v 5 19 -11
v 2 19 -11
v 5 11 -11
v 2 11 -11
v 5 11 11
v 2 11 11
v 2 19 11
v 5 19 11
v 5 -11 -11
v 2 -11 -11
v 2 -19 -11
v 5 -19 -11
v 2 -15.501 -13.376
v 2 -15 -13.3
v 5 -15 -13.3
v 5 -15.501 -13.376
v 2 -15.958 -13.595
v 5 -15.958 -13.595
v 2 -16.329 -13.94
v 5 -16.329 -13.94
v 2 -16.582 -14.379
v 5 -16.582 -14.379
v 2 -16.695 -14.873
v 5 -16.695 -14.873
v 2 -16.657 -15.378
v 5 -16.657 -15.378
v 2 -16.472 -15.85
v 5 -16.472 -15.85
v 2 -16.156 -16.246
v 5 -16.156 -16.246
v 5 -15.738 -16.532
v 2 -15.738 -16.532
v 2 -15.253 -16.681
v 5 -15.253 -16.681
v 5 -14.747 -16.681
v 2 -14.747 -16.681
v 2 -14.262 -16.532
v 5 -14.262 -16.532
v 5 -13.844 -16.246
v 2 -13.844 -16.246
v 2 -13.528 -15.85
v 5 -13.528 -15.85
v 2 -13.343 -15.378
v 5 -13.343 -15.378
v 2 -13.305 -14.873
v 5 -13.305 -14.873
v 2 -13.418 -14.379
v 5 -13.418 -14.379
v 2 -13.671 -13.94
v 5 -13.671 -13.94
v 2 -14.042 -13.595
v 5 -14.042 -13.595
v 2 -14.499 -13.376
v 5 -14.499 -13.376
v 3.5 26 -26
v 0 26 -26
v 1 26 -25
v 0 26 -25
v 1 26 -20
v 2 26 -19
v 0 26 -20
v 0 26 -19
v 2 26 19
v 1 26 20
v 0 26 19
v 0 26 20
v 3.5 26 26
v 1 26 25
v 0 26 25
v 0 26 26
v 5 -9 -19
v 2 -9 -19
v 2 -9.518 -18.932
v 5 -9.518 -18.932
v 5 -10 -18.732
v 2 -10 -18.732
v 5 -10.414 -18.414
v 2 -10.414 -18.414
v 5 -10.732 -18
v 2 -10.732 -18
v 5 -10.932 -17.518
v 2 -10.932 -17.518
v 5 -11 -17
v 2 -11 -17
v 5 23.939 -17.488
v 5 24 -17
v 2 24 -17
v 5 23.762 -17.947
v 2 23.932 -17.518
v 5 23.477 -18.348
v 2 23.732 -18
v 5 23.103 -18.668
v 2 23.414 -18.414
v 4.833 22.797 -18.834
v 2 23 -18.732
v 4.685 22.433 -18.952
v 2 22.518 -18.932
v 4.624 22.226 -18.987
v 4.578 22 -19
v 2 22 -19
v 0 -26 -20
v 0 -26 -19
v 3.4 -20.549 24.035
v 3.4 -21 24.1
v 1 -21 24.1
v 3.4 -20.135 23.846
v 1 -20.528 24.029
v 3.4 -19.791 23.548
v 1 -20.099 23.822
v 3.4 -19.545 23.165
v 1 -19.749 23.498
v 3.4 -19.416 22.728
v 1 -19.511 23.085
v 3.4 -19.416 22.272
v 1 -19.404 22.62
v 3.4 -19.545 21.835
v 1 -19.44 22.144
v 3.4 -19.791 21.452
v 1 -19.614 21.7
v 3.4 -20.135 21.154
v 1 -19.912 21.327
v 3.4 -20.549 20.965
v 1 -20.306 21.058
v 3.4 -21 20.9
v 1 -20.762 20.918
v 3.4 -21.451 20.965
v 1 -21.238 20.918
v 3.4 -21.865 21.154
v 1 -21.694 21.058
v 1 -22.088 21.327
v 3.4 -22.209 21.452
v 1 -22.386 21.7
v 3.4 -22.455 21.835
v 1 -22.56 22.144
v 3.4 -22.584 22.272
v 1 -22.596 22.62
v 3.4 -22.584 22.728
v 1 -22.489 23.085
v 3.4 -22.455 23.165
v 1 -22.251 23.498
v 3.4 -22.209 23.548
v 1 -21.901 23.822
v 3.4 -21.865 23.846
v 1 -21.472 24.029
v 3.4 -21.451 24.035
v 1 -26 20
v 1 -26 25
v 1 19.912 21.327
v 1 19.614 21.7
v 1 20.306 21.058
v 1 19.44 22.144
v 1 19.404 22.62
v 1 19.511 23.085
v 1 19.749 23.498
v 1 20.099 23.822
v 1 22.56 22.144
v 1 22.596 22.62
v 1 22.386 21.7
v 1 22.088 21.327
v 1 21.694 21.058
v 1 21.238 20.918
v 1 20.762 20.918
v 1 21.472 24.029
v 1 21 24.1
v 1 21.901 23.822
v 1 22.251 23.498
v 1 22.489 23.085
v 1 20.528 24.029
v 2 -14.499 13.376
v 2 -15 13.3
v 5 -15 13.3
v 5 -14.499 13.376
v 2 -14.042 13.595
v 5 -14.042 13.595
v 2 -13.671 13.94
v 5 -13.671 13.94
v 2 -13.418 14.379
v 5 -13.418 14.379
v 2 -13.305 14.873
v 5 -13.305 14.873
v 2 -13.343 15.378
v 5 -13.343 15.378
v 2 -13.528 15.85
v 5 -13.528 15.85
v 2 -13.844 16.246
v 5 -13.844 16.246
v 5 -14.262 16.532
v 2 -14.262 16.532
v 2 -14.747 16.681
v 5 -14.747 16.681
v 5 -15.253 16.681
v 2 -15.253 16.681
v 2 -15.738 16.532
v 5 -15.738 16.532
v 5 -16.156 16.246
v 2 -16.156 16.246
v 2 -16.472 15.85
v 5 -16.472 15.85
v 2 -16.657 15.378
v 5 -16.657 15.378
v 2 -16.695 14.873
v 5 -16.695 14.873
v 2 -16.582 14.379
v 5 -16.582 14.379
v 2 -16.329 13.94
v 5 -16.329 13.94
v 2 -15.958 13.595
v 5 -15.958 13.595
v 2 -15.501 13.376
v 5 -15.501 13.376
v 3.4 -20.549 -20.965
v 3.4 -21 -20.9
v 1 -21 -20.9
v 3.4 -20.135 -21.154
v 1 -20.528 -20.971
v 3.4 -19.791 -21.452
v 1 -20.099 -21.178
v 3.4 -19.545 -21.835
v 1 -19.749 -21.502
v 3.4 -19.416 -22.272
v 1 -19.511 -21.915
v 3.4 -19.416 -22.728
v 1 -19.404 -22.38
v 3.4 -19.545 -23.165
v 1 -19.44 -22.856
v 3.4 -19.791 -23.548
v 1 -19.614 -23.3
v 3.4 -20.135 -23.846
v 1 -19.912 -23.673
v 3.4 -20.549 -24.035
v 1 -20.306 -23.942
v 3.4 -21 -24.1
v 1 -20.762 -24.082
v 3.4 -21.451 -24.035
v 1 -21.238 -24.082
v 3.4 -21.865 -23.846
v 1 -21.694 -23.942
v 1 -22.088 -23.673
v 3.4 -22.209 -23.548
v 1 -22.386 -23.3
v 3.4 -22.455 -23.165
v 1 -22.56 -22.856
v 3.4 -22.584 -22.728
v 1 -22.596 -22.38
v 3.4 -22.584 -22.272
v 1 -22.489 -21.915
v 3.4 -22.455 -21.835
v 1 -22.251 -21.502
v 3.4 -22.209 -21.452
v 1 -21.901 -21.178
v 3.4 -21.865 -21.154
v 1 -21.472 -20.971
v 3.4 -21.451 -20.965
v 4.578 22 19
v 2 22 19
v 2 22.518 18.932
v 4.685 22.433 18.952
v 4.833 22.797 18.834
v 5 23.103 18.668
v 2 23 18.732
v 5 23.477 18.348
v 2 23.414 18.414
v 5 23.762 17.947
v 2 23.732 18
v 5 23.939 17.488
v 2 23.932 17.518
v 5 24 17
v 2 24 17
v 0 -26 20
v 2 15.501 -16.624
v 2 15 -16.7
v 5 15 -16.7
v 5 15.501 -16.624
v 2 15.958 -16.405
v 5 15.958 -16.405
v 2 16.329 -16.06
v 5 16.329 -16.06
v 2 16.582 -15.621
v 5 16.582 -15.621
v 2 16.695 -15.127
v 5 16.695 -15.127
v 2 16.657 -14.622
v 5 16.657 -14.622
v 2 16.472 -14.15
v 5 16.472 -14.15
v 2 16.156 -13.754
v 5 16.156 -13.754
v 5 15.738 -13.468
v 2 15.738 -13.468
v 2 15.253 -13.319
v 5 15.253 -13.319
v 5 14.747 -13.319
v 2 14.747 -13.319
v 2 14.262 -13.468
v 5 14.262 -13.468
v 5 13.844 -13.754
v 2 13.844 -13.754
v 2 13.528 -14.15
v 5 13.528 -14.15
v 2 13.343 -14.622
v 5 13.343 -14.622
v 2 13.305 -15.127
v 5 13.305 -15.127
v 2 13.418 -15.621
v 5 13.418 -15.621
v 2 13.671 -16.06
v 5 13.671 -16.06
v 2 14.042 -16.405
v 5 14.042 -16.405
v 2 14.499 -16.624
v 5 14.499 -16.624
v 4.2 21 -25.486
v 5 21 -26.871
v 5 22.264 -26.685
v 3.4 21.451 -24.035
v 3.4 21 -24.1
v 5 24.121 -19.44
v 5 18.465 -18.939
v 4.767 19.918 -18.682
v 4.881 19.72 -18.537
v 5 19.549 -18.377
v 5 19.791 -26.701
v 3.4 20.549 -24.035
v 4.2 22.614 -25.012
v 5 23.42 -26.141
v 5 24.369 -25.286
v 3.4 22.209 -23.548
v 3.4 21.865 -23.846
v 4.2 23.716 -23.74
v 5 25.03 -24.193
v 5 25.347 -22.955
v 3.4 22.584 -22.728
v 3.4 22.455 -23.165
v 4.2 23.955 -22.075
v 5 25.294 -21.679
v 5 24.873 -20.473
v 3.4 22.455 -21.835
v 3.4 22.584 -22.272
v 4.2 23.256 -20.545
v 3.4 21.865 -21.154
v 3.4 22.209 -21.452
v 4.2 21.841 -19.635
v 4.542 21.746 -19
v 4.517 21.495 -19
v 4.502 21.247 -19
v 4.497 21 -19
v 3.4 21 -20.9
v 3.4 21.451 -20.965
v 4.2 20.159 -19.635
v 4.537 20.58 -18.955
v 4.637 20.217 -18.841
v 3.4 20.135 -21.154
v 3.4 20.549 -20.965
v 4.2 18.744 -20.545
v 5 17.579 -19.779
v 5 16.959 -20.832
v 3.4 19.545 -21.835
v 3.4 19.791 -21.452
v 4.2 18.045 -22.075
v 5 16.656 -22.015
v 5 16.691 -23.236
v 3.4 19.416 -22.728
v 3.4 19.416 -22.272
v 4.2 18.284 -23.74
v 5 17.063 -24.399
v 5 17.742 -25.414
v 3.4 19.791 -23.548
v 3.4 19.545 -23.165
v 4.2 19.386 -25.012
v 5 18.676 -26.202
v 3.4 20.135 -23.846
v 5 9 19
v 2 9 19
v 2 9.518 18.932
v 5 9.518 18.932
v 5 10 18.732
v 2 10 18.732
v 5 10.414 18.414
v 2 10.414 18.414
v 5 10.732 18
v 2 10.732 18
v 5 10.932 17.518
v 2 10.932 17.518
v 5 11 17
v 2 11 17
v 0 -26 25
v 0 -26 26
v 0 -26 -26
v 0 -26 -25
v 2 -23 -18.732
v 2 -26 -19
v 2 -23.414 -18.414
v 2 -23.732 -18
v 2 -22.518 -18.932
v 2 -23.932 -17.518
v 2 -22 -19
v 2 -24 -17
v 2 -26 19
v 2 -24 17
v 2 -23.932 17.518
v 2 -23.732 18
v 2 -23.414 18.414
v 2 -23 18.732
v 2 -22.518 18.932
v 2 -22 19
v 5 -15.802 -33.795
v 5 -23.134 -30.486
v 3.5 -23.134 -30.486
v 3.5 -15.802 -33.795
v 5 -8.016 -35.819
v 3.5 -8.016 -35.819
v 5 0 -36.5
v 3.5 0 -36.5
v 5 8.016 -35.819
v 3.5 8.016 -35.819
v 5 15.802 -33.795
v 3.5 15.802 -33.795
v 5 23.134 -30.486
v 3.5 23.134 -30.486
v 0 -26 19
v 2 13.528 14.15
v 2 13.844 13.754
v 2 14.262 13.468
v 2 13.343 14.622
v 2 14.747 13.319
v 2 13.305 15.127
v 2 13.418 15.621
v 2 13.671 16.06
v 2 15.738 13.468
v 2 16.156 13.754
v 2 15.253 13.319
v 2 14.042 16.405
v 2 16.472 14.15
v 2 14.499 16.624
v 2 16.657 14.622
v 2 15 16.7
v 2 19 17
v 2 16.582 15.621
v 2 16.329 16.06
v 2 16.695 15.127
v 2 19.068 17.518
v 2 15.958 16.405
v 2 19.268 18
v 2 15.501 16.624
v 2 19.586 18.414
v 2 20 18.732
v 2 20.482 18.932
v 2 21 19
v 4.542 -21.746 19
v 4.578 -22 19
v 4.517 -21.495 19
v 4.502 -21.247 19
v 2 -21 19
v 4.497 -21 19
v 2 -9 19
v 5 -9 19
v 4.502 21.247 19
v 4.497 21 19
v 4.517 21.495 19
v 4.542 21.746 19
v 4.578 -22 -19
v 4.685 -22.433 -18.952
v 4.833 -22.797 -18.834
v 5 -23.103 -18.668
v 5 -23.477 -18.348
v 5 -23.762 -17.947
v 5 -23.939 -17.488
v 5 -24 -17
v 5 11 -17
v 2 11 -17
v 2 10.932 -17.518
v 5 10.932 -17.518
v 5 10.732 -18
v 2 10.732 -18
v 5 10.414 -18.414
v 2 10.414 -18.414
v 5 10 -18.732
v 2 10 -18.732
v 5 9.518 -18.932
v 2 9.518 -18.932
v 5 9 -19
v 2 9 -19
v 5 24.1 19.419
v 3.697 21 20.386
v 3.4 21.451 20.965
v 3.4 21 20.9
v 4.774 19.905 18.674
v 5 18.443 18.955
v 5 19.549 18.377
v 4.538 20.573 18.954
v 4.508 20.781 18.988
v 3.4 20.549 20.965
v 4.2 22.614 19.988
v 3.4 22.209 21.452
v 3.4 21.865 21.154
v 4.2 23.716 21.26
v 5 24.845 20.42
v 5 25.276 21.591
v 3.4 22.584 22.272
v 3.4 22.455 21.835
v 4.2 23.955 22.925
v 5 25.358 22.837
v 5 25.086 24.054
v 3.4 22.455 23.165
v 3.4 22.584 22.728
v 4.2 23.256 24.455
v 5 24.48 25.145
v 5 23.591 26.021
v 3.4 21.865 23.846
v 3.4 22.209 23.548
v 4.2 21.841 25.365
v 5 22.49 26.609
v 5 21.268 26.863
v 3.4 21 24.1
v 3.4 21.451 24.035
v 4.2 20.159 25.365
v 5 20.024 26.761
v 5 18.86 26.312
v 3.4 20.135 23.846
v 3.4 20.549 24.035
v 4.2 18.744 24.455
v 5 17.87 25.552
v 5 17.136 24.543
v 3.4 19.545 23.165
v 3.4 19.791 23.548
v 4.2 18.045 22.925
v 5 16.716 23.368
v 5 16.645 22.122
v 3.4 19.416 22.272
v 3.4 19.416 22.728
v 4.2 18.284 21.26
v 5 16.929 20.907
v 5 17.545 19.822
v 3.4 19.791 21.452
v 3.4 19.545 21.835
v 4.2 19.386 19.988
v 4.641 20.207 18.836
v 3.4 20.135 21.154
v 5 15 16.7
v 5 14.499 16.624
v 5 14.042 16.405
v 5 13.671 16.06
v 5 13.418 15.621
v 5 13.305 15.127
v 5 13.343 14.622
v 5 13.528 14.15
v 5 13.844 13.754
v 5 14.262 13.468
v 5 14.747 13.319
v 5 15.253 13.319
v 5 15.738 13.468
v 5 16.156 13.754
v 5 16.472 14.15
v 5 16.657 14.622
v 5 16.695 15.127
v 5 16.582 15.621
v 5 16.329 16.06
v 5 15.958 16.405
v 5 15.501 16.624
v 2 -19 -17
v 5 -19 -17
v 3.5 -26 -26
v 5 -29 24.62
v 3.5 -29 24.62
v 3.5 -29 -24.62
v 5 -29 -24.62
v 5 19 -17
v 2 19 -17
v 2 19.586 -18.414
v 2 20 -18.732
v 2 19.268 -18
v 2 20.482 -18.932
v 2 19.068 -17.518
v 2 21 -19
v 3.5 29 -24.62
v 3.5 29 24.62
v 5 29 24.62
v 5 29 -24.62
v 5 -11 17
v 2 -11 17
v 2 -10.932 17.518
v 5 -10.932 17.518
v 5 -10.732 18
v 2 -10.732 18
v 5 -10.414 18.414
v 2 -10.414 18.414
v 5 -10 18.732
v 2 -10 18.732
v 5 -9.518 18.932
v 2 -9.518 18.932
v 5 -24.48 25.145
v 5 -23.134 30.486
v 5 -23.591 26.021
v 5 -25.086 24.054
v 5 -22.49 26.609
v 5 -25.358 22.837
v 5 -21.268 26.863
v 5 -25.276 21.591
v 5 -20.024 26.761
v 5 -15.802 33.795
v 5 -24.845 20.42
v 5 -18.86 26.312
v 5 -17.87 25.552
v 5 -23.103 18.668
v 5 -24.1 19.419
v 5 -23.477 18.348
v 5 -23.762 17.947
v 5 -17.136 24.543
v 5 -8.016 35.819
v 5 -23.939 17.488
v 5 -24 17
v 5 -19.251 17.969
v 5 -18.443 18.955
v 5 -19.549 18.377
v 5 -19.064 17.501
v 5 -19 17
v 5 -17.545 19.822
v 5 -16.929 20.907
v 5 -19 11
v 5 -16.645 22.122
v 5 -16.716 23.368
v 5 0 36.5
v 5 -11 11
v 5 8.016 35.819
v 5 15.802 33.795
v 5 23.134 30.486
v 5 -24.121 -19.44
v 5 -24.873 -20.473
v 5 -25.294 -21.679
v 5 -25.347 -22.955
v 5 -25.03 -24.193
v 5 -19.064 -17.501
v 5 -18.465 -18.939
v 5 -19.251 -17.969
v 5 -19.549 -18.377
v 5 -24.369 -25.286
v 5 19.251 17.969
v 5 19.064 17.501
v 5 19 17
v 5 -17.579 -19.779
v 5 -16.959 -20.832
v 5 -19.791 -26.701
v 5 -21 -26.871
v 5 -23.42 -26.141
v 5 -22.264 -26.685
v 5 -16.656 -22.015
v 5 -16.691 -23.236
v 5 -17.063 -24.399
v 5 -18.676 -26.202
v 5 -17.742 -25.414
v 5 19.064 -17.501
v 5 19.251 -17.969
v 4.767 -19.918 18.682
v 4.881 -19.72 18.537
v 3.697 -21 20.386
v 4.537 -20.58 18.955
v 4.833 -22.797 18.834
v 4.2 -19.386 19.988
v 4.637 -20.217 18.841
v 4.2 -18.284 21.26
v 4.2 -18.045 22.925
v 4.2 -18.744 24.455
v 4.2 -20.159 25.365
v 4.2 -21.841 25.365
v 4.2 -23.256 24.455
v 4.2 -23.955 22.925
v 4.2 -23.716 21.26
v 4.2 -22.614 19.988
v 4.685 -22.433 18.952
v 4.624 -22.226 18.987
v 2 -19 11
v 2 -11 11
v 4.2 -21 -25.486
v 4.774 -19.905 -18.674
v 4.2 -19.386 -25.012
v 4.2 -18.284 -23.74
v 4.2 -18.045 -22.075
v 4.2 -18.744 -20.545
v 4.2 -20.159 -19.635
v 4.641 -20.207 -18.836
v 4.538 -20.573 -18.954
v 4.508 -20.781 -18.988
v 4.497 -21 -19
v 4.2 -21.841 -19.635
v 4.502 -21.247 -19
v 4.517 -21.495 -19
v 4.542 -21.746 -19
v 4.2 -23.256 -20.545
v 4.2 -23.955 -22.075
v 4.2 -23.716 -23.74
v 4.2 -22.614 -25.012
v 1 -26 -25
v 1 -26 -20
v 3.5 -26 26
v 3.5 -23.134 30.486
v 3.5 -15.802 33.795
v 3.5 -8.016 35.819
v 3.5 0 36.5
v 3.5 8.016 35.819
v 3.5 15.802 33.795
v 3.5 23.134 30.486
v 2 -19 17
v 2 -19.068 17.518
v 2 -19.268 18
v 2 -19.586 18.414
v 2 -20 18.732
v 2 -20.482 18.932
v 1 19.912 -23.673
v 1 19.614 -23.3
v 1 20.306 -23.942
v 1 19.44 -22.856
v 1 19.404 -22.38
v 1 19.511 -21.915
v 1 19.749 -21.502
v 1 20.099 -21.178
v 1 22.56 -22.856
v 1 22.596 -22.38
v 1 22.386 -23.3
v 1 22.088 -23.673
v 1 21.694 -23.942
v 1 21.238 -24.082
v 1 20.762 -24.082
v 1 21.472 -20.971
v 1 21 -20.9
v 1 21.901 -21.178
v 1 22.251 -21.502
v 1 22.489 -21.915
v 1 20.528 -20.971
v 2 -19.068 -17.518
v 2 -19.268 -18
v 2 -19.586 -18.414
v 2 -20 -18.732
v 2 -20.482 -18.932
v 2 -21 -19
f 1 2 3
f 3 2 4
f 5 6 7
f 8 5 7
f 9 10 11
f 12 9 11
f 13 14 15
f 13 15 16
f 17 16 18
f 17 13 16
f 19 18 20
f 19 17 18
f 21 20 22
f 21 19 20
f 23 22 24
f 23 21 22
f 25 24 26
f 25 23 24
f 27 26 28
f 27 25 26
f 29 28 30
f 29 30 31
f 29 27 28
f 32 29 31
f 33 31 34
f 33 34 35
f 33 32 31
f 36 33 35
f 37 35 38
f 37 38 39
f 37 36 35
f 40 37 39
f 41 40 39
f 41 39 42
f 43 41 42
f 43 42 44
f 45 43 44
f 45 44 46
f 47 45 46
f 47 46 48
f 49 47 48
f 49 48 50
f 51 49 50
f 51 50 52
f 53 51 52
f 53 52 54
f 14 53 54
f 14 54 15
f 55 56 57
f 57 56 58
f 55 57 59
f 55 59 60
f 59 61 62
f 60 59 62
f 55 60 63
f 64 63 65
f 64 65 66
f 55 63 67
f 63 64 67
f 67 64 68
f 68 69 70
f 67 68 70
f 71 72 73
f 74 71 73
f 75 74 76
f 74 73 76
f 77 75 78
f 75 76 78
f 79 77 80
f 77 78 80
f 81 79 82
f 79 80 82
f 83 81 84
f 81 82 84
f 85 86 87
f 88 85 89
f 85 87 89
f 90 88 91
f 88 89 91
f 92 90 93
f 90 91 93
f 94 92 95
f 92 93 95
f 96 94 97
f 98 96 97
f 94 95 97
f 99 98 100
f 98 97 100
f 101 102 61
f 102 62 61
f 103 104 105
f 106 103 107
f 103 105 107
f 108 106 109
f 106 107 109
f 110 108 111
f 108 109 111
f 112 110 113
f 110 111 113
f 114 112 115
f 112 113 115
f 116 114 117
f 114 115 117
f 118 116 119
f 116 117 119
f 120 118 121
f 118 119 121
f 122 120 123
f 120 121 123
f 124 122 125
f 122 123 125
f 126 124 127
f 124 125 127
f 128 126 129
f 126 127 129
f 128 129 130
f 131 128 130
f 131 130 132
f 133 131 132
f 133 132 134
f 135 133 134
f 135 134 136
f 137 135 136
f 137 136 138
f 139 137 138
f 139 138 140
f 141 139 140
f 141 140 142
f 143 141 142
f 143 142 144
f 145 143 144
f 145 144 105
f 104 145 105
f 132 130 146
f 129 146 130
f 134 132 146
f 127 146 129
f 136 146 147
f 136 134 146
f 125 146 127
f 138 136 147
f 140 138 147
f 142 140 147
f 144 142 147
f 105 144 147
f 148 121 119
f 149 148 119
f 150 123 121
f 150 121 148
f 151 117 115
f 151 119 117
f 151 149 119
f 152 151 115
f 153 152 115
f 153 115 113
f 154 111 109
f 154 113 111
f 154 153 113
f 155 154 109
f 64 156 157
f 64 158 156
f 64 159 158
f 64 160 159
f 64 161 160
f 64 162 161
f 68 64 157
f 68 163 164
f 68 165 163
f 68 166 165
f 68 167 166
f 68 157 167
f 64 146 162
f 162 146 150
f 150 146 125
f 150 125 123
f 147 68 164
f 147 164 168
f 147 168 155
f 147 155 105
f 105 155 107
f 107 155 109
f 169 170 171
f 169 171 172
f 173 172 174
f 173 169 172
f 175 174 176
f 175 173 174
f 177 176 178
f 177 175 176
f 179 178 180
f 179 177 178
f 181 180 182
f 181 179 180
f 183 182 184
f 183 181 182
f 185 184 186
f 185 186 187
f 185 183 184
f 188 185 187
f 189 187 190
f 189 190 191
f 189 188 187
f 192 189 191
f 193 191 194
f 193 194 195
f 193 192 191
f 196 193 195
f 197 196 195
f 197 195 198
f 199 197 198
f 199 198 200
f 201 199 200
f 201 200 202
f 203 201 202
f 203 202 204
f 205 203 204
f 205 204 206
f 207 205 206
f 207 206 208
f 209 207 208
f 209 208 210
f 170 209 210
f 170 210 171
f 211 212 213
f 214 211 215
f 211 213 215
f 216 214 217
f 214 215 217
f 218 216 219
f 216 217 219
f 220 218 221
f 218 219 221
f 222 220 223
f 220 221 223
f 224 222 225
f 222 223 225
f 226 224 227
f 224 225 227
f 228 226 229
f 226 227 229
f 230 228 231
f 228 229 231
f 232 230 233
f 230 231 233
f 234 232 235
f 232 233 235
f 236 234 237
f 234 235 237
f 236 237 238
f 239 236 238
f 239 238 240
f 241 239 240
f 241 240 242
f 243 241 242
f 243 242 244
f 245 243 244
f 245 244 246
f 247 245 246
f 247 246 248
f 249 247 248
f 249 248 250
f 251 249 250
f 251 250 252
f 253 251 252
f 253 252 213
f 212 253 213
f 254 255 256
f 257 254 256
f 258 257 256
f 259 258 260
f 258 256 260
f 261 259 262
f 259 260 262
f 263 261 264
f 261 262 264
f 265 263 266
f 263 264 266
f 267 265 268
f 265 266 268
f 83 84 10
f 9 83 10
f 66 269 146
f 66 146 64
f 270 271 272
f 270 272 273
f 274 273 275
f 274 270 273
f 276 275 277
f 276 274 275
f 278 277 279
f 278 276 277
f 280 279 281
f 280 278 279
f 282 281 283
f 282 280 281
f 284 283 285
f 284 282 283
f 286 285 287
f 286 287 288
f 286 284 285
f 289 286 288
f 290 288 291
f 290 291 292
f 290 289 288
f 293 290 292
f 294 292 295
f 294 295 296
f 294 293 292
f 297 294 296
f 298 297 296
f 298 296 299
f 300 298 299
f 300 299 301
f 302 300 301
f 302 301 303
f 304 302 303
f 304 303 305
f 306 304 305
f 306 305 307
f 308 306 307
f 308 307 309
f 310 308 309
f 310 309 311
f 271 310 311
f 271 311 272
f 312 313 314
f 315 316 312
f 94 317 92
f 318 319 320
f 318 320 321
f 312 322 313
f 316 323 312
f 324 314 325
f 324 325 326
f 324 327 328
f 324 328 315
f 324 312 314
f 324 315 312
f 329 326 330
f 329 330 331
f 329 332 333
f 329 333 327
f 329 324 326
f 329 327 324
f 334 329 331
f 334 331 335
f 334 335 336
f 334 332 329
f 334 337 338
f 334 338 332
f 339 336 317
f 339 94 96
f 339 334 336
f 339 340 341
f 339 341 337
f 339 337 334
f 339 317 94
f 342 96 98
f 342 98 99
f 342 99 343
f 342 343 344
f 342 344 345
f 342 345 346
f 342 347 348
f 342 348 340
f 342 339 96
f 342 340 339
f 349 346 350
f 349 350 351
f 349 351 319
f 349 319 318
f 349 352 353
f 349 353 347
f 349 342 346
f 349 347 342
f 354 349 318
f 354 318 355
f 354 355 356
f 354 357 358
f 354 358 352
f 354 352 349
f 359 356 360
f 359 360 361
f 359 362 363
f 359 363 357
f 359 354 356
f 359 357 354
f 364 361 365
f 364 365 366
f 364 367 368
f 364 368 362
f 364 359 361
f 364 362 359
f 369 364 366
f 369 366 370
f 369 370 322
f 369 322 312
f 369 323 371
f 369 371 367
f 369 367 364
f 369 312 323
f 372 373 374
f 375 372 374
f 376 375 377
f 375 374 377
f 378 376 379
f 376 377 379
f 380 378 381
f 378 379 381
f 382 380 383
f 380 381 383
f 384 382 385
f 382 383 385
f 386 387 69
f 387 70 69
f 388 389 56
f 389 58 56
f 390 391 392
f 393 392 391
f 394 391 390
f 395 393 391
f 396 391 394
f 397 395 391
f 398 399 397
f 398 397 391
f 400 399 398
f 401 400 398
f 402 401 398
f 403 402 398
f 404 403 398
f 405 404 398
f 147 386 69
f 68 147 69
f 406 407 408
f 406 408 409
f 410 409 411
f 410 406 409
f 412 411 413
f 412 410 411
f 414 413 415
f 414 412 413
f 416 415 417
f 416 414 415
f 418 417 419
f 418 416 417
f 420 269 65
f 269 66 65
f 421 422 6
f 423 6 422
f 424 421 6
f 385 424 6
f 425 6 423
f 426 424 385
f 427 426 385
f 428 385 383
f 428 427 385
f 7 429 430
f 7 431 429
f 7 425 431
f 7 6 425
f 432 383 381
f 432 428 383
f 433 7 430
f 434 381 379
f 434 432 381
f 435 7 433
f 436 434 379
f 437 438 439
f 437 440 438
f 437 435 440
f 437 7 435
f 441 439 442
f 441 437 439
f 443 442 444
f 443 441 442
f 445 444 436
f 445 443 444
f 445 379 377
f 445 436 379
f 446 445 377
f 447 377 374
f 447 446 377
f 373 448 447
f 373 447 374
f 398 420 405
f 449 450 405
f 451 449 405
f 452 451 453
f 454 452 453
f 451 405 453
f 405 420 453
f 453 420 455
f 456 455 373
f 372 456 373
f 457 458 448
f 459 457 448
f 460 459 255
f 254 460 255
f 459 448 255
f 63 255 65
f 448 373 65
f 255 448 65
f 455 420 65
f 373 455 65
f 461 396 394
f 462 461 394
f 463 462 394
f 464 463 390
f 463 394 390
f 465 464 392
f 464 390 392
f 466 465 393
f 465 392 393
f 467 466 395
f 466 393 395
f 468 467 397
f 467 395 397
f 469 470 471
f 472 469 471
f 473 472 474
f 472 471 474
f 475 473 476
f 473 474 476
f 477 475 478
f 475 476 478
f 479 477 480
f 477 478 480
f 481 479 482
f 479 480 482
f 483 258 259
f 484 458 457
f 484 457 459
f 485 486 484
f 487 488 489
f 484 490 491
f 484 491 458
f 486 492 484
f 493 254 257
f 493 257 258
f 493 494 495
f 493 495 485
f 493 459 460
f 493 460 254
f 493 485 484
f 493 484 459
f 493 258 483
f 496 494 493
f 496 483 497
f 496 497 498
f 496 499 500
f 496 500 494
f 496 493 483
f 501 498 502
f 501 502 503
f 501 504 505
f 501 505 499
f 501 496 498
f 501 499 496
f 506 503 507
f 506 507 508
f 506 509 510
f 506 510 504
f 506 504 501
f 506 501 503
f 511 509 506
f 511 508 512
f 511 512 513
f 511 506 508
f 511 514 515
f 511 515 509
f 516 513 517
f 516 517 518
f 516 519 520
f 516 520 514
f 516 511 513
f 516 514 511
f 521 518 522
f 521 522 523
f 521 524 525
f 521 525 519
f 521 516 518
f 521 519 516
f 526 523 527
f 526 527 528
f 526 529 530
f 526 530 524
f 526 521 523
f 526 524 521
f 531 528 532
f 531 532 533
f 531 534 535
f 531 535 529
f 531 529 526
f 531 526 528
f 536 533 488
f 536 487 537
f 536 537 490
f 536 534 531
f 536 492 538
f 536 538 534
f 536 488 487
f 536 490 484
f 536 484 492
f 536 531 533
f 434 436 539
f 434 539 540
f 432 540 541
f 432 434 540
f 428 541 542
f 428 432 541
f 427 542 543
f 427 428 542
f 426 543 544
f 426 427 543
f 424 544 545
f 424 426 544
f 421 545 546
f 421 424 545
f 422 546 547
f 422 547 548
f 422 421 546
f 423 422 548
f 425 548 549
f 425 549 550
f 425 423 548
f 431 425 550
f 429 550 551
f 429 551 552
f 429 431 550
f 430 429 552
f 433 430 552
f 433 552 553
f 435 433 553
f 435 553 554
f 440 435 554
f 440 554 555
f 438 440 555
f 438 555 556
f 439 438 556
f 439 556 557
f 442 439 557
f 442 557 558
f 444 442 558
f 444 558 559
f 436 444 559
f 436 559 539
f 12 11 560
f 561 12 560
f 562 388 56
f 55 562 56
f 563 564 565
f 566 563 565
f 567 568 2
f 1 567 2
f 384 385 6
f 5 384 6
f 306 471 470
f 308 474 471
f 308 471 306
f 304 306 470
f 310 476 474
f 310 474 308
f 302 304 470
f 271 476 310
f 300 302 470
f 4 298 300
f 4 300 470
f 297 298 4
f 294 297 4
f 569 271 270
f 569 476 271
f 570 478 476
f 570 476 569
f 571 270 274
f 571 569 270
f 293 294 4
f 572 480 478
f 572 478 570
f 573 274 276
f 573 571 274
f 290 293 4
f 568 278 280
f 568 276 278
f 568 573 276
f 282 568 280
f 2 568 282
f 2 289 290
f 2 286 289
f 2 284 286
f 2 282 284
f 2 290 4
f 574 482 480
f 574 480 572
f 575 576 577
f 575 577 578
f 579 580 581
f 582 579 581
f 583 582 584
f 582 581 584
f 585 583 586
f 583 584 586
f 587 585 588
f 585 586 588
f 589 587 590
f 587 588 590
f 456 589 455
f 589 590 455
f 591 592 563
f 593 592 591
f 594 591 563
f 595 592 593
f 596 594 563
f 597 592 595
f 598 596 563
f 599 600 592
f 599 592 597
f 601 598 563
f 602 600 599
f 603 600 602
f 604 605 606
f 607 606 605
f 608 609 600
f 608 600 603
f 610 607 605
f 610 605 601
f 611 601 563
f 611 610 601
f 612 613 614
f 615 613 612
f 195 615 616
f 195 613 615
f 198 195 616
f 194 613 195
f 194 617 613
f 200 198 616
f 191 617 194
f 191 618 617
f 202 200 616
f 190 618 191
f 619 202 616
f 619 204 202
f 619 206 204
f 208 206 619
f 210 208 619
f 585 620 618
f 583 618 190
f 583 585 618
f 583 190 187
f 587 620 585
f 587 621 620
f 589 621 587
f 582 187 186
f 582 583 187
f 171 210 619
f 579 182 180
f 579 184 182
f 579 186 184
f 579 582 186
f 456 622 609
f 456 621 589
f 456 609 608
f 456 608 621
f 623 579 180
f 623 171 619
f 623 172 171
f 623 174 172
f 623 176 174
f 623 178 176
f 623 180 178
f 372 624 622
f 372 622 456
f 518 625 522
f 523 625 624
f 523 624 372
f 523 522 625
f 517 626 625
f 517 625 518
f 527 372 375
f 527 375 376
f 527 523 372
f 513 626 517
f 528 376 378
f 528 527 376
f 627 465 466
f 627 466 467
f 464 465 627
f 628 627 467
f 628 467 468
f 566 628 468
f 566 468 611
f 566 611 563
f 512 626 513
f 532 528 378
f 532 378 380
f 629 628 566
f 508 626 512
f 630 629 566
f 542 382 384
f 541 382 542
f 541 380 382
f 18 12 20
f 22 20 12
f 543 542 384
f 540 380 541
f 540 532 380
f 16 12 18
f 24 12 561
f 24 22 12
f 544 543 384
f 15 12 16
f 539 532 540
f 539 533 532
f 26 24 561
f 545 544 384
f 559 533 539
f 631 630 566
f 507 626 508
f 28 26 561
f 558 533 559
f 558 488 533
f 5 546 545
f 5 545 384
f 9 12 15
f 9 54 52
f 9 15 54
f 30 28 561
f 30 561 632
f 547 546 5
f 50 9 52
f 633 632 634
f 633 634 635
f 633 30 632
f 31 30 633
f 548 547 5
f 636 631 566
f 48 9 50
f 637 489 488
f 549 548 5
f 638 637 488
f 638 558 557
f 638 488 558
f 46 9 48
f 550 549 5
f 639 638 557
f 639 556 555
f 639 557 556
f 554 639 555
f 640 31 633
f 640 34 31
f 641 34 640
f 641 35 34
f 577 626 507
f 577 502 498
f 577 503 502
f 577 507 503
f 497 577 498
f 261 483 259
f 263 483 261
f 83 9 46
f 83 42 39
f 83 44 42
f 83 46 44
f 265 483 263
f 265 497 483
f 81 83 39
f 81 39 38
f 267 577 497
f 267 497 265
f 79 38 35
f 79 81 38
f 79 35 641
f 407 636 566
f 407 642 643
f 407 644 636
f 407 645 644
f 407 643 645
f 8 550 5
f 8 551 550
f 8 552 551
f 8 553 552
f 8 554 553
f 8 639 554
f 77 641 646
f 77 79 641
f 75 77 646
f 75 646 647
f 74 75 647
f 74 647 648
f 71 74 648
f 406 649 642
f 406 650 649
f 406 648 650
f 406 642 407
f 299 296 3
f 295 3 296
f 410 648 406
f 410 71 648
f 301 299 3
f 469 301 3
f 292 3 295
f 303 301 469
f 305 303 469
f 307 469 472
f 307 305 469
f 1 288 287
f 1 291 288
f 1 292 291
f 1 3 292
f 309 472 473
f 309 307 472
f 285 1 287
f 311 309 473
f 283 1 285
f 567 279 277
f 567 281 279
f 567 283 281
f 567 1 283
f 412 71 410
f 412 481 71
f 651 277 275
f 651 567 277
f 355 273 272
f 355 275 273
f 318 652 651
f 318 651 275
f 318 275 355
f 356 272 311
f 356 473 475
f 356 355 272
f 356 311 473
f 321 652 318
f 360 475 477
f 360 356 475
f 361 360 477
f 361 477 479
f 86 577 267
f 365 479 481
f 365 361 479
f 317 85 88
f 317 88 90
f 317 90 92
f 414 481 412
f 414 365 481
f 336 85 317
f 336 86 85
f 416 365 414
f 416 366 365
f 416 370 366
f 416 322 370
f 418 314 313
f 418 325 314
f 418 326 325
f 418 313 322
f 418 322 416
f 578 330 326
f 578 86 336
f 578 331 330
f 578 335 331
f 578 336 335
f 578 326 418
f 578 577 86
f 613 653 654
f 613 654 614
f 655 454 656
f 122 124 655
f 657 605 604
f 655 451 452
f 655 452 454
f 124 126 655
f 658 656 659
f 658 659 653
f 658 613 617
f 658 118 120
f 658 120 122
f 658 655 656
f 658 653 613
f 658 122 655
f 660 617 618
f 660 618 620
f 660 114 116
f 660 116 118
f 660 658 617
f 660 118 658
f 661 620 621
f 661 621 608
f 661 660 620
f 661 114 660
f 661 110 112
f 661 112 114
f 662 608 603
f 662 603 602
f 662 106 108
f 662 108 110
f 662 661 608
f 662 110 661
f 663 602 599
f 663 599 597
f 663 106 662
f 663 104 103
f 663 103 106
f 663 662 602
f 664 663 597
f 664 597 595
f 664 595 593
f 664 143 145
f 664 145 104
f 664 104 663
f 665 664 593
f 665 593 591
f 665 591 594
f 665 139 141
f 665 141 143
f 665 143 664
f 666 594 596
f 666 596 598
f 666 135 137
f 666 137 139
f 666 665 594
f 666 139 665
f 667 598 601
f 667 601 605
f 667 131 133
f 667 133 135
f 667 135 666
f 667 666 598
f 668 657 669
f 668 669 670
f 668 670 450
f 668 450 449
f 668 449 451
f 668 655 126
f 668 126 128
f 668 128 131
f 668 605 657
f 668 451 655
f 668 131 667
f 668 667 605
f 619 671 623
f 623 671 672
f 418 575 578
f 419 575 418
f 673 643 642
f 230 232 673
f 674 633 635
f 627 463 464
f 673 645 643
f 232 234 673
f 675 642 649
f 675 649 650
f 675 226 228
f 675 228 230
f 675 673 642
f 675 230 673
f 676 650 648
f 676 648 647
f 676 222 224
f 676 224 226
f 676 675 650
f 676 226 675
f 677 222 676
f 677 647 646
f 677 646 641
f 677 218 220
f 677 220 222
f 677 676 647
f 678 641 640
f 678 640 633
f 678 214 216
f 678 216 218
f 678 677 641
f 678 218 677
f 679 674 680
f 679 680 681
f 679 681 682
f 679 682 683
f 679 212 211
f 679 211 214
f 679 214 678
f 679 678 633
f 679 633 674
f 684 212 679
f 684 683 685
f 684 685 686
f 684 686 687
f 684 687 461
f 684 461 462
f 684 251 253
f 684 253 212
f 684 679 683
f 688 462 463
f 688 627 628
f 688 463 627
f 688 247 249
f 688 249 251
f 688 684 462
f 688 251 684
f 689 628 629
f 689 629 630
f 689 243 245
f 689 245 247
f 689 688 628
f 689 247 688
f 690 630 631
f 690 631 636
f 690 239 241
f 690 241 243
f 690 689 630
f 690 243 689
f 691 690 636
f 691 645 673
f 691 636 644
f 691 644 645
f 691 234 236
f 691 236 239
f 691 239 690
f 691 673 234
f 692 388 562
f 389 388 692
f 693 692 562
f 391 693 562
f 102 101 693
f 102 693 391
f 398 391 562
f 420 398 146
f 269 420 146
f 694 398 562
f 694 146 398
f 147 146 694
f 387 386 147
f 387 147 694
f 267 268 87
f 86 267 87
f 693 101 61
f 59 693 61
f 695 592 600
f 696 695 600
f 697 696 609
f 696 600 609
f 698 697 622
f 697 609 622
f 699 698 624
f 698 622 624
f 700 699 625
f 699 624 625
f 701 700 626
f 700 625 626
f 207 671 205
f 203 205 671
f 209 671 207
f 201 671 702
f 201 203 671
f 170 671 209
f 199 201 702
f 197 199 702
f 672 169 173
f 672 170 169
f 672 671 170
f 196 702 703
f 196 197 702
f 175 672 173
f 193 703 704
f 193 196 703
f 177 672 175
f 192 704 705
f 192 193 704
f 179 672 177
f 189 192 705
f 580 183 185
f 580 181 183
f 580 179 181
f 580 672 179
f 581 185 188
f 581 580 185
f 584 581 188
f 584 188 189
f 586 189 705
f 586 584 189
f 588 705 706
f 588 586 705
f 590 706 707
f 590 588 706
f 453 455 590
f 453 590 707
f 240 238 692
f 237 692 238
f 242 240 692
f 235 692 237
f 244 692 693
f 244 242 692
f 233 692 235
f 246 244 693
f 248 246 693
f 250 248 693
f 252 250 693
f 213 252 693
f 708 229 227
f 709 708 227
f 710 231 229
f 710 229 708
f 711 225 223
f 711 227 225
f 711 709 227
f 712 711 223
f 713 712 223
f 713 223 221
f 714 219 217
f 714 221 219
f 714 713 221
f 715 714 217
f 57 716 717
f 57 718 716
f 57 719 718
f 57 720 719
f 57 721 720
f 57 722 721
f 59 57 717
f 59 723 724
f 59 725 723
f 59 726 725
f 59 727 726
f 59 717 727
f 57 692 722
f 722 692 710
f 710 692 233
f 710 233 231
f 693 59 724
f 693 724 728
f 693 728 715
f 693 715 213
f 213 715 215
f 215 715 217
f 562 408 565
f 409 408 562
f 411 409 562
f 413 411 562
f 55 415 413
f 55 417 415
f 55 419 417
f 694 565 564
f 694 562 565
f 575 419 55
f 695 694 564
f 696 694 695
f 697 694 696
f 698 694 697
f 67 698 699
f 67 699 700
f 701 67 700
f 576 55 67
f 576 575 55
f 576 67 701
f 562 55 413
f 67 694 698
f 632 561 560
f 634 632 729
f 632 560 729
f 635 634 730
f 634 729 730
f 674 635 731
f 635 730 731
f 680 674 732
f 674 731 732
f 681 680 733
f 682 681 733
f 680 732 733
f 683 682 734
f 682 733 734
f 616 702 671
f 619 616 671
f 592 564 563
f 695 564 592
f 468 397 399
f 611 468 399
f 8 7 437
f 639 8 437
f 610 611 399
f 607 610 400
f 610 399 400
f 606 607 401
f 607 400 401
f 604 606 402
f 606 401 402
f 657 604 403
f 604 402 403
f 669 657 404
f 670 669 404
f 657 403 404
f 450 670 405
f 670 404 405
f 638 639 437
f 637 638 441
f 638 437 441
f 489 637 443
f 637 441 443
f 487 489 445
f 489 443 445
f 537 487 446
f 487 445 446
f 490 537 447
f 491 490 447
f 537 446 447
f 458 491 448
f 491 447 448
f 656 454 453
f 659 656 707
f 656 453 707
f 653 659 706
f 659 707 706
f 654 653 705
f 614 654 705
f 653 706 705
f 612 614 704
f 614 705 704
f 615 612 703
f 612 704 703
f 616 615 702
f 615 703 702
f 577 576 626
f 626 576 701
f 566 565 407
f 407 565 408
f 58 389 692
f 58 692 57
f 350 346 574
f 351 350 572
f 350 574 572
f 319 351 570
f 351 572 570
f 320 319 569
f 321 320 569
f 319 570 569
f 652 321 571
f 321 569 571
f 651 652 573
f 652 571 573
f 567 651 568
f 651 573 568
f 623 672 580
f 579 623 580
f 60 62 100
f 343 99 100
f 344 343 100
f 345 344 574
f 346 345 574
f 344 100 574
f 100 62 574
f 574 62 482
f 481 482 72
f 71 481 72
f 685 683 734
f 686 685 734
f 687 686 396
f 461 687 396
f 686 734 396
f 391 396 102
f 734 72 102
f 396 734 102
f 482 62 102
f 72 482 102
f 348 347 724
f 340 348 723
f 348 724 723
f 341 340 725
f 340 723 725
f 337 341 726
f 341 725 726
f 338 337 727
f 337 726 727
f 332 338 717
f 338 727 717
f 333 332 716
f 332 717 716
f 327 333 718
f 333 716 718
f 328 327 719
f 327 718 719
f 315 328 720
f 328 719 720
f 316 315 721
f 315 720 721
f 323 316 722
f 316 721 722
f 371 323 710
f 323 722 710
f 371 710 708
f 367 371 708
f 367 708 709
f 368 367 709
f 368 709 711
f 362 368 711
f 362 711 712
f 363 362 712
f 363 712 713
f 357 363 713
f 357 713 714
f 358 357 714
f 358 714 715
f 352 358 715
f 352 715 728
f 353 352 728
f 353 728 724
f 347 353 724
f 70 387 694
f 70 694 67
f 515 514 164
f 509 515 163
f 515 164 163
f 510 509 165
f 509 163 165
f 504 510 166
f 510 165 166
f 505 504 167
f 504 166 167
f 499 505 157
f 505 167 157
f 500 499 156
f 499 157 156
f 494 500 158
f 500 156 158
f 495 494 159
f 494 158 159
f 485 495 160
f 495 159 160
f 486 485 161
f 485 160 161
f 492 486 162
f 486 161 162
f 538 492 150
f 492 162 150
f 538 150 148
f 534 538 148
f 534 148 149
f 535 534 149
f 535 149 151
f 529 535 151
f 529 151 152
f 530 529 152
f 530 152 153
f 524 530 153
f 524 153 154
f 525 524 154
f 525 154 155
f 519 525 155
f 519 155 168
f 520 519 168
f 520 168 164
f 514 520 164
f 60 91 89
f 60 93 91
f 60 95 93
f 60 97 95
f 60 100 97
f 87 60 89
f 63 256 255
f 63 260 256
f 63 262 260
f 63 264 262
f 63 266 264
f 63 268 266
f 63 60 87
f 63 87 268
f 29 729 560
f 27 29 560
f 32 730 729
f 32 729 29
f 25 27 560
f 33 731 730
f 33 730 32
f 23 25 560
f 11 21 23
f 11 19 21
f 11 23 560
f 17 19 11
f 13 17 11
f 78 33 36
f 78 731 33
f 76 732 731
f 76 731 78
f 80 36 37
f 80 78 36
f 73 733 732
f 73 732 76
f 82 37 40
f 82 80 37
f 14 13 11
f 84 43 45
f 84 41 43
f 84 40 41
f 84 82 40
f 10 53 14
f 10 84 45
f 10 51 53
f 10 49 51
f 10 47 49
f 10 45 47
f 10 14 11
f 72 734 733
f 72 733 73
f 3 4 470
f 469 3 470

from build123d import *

# Parameters (mm, degrees)
SKETCH_1_W                  = 58
SKETCH_1_H                  = 58
SKETCH_1_R                  = 1.7
EXTRUDE_1_DEPTH             = 5
SKETCH_2_W                  = 58
SKETCH_2_H                  = 58
SKETCH_2_W_2                = 52
SKETCH_2_H_2                = 52
CUT_EXTRUDE_1_DEPTH         = 3.5
SKETCH_3_W                  = 38
SKETCH_3_H                  = 52
CUT_EXTRUDE_2_DEPTH         = 2
SKETCH_4_W                  = 5
SKETCH_4_H                  = 52
CUT_EXTRUDE_3_DEPTH         = 1
SKETCH_8_R                  = 1.6
CUT_EXTRUDE_4_DEPTH         = 2.4
PATTERN_LINEAR_1_COUNT      = 2
PATTERN_LINEAR_1_PITCH      = 45
PATTERN_LINEAR_1_COUNT_DIR2 = 2
PATTERN_LINEAR_1_PITCH_DIR2 = 42
EXTRUDE_2_DEPTH             = 1.5
SKETCH_12_R                 = 63.004873171
CUT_EXTRUDE_6_DEPTH         = 1.5
CHAMFER_2_SIZE              = 2
CHAMFER_3_SIZE              = 2
CHAMFER_5_SIZE              = 2
CHAMFER_6_SIZE              = 2


with BuildPart() as part:
    # 草图1 → 凸台-拉伸1 (new body)
    with BuildSketch(Plane(origin=(0, 0, 0), x_dir=(0, 0, -1), z_dir=(1, 0, 0))):
        Rectangle(SKETCH_1_W, SKETCH_1_H)
        with Locations((15, 15)):
            Circle(SKETCH_1_R, mode=Mode.SUBTRACT)
        with Locations(Location((-15, 15, 0), (0, 0, 180))):
            Circle(SKETCH_1_R, mode=Mode.SUBTRACT)
        with Locations((-15, -15)):
            Circle(SKETCH_1_R, mode=Mode.SUBTRACT)
        with Locations(Location((15, -15, 0), (0, 0, 180))):
            Circle(SKETCH_1_R, mode=Mode.SUBTRACT)
        with BuildLine():
            Line((-17, 24), (17, 24))
            ThreePointArc((17, 24), (18.414213562, 23.414213562), (19, 22))
            Line((19, 22), (19, 21))
            ThreePointArc((19, 21), (18.414213562, 19.585786438), (17, 19))
            Line((17, 19), (11, 19))
            Line((11, 19), (11, 11))
            Line((11, 11), (17, 11))
            ThreePointArc((17, 11), (18.414213562, 10.414213562), (19, 9))
            Line((19, 9), (19, -9))
            ThreePointArc((19, -9), (18.414213562, -10.414213562), (17, -11))
            Line((17, -11), (11, -11))
            Line((11, -11), (11, -19))
            Line((11, -19), (17, -19))
            ThreePointArc((17, -19), (18.414213562, -19.585786438), (19, -21))
            Line((19, -21), (19, -22))
            ThreePointArc((19, -22), (18.414213562, -23.414213562), (17, -24))
            Line((17, -24), (-17, -24))
            ThreePointArc((-17, -24), (-18.414213562, -23.414213562), (-19, -22))
            Line((-19, -22), (-19, -21))
            ThreePointArc((-19, -21), (-18.414213562, -19.585786438), (-17, -19))
            Line((-17, -19), (-11, -19))
            Line((-11, -19), (-11, -11))
            Line((-11, -11), (-17, -11))
            ThreePointArc((-17, -11), (-18.414213562, -10.414213562), (-19, -9))
            Line((-19, -9), (-19, 9))
            ThreePointArc((-19, 9), (-18.414213562, 10.414213562), (-17, 11))
            Line((-17, 11), (-11, 11))
            Line((-11, 11), (-11, 19))
            Line((-11, 19), (-17, 19))
            ThreePointArc((-17, 19), (-18.414213562, 19.585786438), (-19, 21))
            Line((-19, 21), (-19, 22))
            ThreePointArc((-19, 22), (-18.414213562, 23.414213562), (-17, 24))
        make_face(mode=Mode.SUBTRACT)
    extrude(amount=EXTRUDE_1_DEPTH)

    # 草图2 → 切除-拉伸1 (cut)
    with BuildSketch(Plane.ZY):
        Rectangle(SKETCH_2_W, SKETCH_2_H)
        Rectangle(SKETCH_2_W_2, SKETCH_2_H_2, mode=Mode.SUBTRACT)
    extrude(amount=-CUT_EXTRUDE_1_DEPTH, mode=Mode.SUBTRACT)

    # 草图3 → 切除-拉伸2 (cut)
    with BuildSketch(Plane.ZY):
        Rectangle(SKETCH_3_W, SKETCH_3_H)
    extrude(amount=-CUT_EXTRUDE_2_DEPTH, mode=Mode.SUBTRACT)

    # 草图4 → 切除-拉伸3 (cut)
    with BuildSketch(Plane.ZY):
        with Locations((-22.5, 0)):
            Rectangle(SKETCH_4_W, SKETCH_4_H)
        with Locations((22.5, 0)):
            Rectangle(SKETCH_4_W, SKETCH_4_H)
    extrude(amount=-CUT_EXTRUDE_3_DEPTH, mode=Mode.SUBTRACT)

    # 草图8 → 切除-拉伸4 (cut)
    with BuildSketch(Plane.ZY.offset(-1)):
        with Locations((22.5, 21)):
            Circle(SKETCH_8_R)
    cut_extrude_4 = extrude(amount=-CUT_EXTRUDE_4_DEPTH, mode=Mode.SUBTRACT)

    # 草图9 → 切除-旋转2 (revolve, cut)
    with BuildSketch(Plane.XY.offset(22.5), mode=Mode.PRIVATE) as cut_revolve_2_sk:
        Polygon((3.4, 19.4), (3.4, 21), (5, 21), (5, 16.628718708), align=None)
    cut_revolve_2 = revolve(cut_revolve_2_sk.sketch.rotate(Axis((3.417252413, 21, 22.5), (1, 0, 0)), 90), axis=Axis((3.417252413, 21, 22.5), (1, 0, 0)), mode=Mode.SUBTRACT)

    # 阵列(线性)1: 切除-拉伸4, Cut-Revolve 2 2 × 2
    with Locations(*[(0, -j * PATTERN_LINEAR_1_PITCH_DIR2, -i * PATTERN_LINEAR_1_PITCH) for i in range(PATTERN_LINEAR_1_COUNT) for j in range(PATTERN_LINEAR_1_COUNT_DIR2) if (i, j) != (0, 0)]):
        add(cut_extrude_4, mode=Mode.SUBTRACT)
        add(cut_revolve_2, mode=Mode.SUBTRACT)

    # 草图10 → 凸台-拉伸2 (add)
    with BuildSketch(Plane(origin=(5, 0, 0), x_dir=(0, 0, -1), z_dir=(1, 0, 0))):
        with BuildLine():
            Line((-29, 25.617376915), (-29, -25.617376915))
            ThreePointArc((-29, -25.617376915), (-36.5, 0), (-29, 25.617376915))
        make_face()
        with BuildLine():
            Line((29, 25.617376915), (29, -25.617376915))
            ThreePointArc((29, -25.617376915), (36.5, 0), (29, 25.617376915))
        make_face()
    extrude(amount=-EXTRUDE_2_DEPTH)

    # 草图12 → 切除-拉伸6 (cut)
    with BuildSketch(Plane(origin=(5, 0, 0), x_dir=(0, 0, -1), z_dir=(1, 0, 0))):
        Circle(SKETCH_12_R)
        with BuildLine():
            ThreePointArc((0, -46.208765402), (36.5, 0), (0, 46.208765402))
            ThreePointArc((0, 46.208765402), (-36.5, 0), (0, -46.208765402))
        make_face(mode=Mode.SUBTRACT)
    extrude(amount=-CUT_EXTRUDE_6_DEPTH, mode=Mode.SUBTRACT)

    # 倒角2
    # the kernel refuses this chamfer: 11.02112637, 2 mm, written as the material it takes off along each edge
    with BuildSketch(Plane(origin=(-15.143908505, 29, 26.619808612), x_dir=(0, 0, -1), z_dir=(1, 0, 0))) as chamfer_2_piece_1:
        with BuildLine():
            Line((CHAMFER_2_SIZE, 0), (-3.865883602, -5.865883602))
            ThreePointArc((-3.865883602, -5.865883602), (-2.160150245, -3.0422483), (0, 0))
            Line((0, 0), (CHAMFER_2_SIZE, 0))
        make_face()
    extrude(amount=38.787817011, mode=Mode.SUBTRACT)

    # 倒角3
    # the kernel refuses this chamfer: 11.02112637, 2 mm, written as the material it takes off along each edge
    with BuildSketch(Plane(origin=(-15.143908505, 29, -26.619808612), x_dir=(0, 0, 1), z_dir=(1, 0, 0))) as chamfer_3_piece_1:
        with BuildLine():
            Line((CHAMFER_3_SIZE, 0), (-3.865883602, 5.865883602))
            ThreePointArc((-3.865883602, 5.865883602), (-2.160150245, 3.0422483), (0, 0))
            Line((0, 0), (CHAMFER_3_SIZE, 0))
        make_face()
    extrude(amount=38.787817011, mode=Mode.SUBTRACT)

    # 倒角5
    # the kernel refuses this chamfer: 11.02112637, 2 mm, written as the material it takes off along each edge
    with BuildSketch(Plane(origin=(-15.143908505, -29, -26.619808612), x_dir=(0, 0, 1), z_dir=(1, 0, 0))) as chamfer_5_piece_1:
        with BuildLine():
            Line((CHAMFER_5_SIZE, 0), (-3.865883602, -5.865883602))
            ThreePointArc((-3.865883602, -5.865883602), (-2.160150245, -3.0422483), (0, 0))
            Line((0, 0), (CHAMFER_5_SIZE, 0))
        make_face()
    extrude(amount=38.787817011, mode=Mode.SUBTRACT)

    # 倒角6
    # the kernel refuses this chamfer: 11.02112637, 2 mm, written as the material it takes off along each edge
    with BuildSketch(Plane(origin=(-15.143908505, -29, 26.619808612), x_dir=(0, 0, -1), z_dir=(1, 0, 0))) as chamfer_6_piece_1:
        with BuildLine():
            Line((CHAMFER_6_SIZE, 0), (-3.865883602, 5.865883602))
            ThreePointArc((-3.865883602, 5.865883602), (-2.160150245, 3.0422483), (0, 0))
            Line((0, 0), (CHAMFER_6_SIZE, 0))
        make_face()
    extrude(amount=38.787817011, mode=Mode.SUBTRACT)


solid = part.part
